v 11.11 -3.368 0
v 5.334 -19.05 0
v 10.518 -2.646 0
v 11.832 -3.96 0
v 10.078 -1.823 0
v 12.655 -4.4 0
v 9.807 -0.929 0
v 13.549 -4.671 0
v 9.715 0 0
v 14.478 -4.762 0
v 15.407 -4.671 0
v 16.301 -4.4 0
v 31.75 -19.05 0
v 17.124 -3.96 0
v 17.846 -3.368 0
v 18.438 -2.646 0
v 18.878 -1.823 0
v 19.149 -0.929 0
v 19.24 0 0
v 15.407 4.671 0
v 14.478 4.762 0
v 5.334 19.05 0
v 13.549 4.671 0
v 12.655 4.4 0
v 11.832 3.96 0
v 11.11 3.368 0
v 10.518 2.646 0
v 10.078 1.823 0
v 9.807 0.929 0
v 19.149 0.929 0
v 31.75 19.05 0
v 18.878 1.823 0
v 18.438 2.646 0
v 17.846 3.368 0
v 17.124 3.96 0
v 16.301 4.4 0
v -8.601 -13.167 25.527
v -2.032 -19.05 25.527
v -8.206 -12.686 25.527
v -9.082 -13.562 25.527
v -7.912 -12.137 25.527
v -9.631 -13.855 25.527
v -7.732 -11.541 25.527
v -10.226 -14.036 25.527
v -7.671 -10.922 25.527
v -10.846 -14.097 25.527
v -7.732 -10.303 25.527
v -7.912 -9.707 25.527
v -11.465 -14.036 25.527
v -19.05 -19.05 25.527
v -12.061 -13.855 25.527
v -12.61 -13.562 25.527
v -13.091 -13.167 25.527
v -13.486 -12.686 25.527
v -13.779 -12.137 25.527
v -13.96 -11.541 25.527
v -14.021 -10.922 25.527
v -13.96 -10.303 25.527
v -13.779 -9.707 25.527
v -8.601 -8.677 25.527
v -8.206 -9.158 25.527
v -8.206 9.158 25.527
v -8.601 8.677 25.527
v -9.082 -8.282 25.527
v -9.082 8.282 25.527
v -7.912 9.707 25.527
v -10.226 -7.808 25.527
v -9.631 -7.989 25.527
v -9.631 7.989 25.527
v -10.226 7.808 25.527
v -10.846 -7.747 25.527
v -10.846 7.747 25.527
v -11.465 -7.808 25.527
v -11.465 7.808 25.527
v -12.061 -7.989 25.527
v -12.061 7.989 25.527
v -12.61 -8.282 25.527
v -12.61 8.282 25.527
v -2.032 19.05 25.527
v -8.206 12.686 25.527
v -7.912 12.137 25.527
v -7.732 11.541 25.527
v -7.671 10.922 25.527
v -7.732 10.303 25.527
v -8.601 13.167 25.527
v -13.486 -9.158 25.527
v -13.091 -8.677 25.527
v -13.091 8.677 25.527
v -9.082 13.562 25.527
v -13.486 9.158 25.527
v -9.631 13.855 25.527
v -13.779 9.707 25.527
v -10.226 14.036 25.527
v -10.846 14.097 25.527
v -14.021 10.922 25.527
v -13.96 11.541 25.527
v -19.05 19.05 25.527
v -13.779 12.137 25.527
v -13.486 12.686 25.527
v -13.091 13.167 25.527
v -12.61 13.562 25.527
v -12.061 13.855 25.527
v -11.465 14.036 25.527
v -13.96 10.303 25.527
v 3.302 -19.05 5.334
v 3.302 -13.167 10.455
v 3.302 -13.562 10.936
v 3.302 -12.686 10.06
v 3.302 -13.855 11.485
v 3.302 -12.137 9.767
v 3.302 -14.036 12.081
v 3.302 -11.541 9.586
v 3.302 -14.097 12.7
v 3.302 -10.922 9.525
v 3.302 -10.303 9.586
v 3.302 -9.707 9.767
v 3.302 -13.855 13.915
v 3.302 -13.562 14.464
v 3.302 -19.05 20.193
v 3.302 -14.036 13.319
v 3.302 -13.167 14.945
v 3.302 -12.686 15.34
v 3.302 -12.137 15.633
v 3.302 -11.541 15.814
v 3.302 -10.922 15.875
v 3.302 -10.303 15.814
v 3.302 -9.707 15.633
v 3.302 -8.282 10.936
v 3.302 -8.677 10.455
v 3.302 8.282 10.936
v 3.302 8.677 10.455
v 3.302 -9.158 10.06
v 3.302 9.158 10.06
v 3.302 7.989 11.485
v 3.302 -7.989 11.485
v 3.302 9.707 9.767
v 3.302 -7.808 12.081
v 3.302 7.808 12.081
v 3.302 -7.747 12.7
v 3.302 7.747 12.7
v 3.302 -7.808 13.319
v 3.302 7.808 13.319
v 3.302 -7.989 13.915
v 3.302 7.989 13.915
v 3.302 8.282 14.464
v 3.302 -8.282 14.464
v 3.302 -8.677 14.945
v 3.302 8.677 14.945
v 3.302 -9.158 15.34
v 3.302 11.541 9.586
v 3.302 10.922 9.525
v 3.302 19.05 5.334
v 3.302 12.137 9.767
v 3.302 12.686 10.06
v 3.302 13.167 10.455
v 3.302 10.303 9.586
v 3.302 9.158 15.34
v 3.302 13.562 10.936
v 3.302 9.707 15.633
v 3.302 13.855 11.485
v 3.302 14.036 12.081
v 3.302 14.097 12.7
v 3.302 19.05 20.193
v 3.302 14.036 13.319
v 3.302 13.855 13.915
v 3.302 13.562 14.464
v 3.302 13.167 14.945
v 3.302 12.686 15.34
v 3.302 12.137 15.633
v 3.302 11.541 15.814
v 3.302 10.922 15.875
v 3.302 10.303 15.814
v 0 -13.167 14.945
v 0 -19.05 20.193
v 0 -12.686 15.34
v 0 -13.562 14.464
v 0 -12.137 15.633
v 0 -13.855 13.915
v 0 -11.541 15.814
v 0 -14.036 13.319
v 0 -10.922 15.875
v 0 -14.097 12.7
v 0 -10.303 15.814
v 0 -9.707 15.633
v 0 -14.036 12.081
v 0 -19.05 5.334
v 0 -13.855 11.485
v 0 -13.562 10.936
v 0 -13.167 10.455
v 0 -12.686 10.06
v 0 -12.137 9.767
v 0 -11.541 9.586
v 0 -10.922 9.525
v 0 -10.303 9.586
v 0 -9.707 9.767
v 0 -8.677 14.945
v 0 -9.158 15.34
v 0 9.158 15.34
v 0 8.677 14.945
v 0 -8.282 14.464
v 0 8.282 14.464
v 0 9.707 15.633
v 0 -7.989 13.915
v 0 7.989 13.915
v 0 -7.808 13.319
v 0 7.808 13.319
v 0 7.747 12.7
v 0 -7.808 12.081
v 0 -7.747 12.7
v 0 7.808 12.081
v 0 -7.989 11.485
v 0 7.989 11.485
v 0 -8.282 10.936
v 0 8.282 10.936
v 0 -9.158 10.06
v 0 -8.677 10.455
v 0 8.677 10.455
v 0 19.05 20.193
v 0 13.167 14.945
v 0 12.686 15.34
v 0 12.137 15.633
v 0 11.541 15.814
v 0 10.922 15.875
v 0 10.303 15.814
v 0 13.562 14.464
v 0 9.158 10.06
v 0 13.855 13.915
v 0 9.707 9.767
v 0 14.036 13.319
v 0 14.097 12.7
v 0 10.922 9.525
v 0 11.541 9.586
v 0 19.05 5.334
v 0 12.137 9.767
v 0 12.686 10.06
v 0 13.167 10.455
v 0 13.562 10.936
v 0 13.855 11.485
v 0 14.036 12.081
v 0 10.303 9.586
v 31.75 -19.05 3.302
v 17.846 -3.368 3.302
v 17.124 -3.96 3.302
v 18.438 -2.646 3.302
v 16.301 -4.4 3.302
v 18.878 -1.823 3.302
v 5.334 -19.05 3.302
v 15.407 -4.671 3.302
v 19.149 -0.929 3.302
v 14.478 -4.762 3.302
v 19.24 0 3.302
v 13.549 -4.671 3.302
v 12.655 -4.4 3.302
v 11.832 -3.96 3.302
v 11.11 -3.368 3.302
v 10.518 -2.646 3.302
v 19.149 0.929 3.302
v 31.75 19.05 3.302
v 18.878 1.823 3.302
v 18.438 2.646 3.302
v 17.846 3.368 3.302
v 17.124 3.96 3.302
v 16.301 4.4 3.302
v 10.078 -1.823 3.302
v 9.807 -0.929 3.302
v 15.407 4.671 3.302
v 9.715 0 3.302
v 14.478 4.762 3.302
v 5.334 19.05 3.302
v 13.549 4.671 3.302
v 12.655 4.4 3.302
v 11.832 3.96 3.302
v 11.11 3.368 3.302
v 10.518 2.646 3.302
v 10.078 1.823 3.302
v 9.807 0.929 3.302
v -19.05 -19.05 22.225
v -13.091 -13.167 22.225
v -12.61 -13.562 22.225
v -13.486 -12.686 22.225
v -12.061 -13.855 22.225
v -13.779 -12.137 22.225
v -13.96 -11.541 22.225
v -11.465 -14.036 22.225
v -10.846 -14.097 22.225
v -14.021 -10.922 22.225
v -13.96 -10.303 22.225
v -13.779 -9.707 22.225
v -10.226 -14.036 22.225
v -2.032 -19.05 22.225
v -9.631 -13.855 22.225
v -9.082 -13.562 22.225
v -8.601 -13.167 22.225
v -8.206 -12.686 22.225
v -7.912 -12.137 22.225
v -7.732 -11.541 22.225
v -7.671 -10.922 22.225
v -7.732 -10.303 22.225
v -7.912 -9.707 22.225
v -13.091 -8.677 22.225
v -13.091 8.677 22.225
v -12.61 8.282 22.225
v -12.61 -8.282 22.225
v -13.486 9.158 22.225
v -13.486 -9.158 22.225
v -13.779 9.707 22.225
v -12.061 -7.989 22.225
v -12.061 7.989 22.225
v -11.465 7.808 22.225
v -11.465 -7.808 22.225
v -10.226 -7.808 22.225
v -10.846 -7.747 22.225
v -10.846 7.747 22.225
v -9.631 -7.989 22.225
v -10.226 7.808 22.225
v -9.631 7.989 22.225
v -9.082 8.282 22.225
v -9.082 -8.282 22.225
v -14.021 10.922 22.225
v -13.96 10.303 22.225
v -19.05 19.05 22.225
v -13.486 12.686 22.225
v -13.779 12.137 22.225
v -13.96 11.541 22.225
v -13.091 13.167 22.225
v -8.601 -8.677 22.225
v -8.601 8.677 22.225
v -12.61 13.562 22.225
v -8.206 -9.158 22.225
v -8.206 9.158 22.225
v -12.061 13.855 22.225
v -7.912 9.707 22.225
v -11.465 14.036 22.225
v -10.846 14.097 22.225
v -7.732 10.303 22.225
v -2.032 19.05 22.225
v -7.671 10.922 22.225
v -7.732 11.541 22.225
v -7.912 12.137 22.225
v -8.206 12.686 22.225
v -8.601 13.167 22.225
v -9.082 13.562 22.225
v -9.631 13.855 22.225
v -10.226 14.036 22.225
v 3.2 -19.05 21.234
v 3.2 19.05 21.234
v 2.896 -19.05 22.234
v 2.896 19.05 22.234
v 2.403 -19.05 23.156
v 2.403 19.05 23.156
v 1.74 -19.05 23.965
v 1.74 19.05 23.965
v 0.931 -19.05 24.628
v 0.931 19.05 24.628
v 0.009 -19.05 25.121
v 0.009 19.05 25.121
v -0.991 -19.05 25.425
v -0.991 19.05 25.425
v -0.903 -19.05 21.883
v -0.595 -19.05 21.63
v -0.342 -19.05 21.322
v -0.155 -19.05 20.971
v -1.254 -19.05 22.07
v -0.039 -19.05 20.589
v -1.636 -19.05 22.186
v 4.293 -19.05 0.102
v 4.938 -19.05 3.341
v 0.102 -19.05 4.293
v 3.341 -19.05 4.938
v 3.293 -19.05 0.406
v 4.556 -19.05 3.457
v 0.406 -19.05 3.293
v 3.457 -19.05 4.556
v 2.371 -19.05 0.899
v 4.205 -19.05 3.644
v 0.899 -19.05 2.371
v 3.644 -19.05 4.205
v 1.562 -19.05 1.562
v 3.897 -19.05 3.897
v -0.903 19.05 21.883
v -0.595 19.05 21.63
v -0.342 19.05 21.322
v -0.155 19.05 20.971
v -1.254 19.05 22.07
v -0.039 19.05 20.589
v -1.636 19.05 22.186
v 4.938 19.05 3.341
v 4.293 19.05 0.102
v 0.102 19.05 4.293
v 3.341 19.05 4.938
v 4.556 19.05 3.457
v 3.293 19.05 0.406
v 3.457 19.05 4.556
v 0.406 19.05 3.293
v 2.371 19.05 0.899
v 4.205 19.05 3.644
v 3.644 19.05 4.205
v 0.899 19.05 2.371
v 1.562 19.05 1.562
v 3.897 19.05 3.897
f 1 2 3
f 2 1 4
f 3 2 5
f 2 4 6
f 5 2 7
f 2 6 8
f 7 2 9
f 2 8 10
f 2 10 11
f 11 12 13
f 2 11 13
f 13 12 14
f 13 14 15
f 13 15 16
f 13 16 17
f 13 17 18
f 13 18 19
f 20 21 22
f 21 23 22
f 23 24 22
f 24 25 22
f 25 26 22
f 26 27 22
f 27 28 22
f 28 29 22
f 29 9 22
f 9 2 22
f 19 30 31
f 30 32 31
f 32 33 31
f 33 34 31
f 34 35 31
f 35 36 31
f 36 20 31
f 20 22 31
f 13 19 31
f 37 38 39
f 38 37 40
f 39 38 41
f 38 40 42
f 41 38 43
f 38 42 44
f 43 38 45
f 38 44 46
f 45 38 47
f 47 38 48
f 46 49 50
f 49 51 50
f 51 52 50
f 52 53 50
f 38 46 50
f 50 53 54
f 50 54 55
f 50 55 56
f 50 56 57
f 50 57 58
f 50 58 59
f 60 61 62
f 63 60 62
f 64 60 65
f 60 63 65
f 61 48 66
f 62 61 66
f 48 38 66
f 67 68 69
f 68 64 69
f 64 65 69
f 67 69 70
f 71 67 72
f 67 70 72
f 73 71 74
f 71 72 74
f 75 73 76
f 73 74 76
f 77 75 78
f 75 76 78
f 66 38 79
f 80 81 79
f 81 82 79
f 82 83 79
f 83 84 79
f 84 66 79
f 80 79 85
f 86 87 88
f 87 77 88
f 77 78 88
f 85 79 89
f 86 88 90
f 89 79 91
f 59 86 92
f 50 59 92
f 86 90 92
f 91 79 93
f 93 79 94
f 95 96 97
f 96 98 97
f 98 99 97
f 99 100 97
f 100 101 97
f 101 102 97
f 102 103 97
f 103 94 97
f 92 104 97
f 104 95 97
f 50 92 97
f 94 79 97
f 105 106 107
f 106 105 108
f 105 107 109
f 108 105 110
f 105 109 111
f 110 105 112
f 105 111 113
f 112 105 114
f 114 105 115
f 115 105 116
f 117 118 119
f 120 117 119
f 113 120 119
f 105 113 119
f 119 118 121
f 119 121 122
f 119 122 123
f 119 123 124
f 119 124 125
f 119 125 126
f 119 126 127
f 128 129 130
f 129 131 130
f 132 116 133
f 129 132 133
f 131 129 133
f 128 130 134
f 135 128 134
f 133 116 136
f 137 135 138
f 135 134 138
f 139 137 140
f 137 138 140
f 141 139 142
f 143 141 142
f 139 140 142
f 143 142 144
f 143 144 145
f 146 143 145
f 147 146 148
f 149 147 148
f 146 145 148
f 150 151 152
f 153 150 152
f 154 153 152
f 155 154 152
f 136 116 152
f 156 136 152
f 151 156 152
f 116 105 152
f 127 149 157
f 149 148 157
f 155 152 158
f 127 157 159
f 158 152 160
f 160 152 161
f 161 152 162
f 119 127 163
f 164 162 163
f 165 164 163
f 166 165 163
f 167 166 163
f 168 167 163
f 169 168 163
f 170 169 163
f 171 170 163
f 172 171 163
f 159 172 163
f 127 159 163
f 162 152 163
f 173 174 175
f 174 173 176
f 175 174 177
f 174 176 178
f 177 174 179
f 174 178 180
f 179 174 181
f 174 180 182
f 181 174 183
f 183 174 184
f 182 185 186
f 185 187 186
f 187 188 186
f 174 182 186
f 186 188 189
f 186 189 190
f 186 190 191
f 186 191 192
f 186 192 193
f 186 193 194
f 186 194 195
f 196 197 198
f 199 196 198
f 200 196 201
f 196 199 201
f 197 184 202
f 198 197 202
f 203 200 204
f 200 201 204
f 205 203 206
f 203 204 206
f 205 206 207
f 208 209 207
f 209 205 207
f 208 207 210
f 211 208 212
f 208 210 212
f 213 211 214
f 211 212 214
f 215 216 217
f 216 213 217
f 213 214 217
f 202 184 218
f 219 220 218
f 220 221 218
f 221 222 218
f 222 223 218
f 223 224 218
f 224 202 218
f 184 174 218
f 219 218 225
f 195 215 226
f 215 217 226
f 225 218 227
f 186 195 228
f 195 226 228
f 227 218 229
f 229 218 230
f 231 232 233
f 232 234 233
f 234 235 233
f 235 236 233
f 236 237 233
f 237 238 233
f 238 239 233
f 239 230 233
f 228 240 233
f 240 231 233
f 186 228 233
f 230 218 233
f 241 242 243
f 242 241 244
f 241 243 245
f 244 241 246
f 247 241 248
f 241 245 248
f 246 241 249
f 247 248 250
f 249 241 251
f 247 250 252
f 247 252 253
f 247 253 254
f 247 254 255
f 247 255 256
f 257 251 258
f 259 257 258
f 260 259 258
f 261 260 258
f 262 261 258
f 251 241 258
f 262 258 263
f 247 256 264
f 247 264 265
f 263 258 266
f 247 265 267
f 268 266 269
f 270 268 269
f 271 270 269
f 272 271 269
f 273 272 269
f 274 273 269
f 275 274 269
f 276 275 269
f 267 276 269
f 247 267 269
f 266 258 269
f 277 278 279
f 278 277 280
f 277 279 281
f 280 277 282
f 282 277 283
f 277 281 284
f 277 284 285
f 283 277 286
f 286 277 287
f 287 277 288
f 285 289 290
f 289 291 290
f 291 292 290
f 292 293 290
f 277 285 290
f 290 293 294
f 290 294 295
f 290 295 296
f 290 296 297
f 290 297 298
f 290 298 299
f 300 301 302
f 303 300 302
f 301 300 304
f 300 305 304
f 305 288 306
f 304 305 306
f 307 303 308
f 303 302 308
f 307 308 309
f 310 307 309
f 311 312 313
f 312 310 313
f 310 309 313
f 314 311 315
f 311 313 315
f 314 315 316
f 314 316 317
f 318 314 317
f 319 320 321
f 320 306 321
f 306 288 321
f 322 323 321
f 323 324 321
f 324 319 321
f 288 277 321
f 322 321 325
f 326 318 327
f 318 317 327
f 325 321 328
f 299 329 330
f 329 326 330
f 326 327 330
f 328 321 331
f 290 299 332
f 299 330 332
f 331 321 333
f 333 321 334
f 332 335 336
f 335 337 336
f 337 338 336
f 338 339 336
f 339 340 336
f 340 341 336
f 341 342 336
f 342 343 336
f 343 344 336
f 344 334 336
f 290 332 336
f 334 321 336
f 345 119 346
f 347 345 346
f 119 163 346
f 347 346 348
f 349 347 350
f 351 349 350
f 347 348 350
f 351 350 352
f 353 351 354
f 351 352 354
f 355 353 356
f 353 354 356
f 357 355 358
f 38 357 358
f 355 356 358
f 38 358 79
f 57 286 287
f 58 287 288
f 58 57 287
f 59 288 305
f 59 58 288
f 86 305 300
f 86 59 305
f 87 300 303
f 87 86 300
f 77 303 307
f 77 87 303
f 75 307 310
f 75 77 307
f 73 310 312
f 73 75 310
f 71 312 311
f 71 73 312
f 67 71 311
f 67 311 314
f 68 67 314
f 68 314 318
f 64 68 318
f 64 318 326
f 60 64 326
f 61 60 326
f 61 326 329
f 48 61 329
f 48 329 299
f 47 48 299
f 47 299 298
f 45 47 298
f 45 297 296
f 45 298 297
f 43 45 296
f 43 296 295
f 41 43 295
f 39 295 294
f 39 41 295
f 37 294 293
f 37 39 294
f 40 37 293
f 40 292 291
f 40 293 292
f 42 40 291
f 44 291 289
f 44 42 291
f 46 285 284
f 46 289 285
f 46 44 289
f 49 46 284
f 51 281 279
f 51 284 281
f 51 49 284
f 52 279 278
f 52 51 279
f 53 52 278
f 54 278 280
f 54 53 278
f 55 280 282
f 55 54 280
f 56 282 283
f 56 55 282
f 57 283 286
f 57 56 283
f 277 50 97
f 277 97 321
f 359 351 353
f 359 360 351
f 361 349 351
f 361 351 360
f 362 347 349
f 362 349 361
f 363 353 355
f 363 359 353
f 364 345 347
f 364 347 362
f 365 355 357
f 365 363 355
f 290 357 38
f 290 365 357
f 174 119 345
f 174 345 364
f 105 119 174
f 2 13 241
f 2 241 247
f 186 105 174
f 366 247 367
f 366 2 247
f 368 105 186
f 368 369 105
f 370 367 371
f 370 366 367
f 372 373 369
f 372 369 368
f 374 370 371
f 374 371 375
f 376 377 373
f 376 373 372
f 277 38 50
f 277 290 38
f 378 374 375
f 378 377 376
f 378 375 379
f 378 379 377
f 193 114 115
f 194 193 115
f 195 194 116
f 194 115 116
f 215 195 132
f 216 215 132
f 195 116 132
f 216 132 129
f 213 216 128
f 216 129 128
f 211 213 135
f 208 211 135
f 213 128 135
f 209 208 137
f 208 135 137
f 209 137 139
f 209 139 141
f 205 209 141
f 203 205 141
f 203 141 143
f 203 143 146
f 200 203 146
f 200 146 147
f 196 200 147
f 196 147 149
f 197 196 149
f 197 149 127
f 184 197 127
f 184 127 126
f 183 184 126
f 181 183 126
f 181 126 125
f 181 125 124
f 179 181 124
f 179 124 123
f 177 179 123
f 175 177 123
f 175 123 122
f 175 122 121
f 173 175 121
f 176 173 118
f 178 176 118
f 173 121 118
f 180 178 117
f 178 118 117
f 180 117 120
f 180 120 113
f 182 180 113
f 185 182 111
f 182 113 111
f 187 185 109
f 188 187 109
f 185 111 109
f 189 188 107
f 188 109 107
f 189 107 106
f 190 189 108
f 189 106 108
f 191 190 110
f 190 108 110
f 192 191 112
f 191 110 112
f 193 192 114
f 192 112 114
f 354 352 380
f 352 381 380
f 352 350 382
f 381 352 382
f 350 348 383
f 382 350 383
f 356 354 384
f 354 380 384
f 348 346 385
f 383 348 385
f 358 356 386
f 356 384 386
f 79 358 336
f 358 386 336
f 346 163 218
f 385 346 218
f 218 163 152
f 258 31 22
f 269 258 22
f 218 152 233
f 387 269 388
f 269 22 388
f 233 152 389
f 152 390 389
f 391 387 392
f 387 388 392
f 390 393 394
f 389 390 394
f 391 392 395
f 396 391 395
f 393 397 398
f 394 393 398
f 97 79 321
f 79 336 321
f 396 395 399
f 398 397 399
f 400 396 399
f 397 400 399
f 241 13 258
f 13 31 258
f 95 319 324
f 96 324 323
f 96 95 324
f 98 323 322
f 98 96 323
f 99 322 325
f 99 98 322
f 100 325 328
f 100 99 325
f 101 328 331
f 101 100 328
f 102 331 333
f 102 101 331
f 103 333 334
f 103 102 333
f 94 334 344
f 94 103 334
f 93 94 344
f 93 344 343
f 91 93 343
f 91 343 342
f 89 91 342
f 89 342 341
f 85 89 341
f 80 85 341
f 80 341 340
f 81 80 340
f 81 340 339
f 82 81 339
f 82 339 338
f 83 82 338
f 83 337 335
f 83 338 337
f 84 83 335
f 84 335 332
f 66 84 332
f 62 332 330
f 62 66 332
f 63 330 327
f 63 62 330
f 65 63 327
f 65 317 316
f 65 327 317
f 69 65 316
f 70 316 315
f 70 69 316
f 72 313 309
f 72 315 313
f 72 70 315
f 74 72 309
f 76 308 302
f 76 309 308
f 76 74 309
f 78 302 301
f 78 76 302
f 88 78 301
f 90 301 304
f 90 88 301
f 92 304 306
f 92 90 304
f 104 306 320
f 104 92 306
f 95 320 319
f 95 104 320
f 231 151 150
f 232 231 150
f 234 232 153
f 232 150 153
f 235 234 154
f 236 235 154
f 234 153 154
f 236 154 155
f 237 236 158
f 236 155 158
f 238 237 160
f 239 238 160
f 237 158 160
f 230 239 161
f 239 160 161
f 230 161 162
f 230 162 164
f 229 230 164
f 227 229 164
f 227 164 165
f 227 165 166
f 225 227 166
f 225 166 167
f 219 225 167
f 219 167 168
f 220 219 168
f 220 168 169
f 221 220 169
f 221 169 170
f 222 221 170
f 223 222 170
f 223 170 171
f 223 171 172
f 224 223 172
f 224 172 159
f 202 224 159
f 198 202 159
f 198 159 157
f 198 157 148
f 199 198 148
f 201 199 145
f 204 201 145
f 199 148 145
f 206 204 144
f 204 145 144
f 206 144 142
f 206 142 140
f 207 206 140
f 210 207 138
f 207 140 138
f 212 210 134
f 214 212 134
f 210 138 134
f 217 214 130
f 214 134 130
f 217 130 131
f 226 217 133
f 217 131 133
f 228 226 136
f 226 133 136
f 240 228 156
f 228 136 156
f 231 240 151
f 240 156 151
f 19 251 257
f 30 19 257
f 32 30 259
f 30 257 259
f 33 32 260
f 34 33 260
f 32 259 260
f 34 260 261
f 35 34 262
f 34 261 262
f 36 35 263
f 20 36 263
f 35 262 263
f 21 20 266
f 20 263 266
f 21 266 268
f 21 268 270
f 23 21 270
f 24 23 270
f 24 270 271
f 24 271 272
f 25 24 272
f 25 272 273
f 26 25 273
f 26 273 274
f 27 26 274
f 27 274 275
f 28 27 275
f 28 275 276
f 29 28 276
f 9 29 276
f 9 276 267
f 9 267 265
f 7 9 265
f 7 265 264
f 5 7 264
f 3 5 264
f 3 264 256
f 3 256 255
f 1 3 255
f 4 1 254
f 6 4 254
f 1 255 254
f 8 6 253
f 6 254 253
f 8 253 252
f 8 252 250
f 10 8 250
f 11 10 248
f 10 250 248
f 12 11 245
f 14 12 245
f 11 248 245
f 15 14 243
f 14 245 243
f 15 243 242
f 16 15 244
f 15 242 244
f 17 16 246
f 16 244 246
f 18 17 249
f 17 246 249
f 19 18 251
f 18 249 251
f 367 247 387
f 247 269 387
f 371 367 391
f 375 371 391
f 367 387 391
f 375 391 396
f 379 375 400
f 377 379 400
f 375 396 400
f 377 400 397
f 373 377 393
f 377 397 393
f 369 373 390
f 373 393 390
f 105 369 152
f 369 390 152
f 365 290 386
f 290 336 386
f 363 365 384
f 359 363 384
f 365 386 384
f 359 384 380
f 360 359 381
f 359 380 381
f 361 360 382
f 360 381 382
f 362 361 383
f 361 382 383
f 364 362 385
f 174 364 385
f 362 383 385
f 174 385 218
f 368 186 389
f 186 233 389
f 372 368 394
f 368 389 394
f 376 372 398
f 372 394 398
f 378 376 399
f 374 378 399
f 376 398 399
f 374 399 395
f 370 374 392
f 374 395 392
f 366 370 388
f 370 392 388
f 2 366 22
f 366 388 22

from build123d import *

# Parameters (mm, degrees)
EXTRUDE_THIN1_DEPTH = 19.05
SKETCH4_R           = 3.175
EXTRUDE3_DEPTH      = 26.527
SKETCH9_R           = 3.175
CUT_EXTRUDE3_DEPTH  = 23.352
SKETCH8_R           = 4.7625
CUT_EXTRUDE2_DEPTH  = 4.302


with BuildPart() as part:
    # Sketch1 → Extrude-Thin1 (new body, symmetric)
    with BuildSketch(Plane(origin=(0, 0, 0), x_dir=(1, 0, 0), z_dir=(0, 1, 0))):
        with BuildLine():
            Line((-19.05, -22.225), (-2.032, -22.225))
            ThreePointArc((-2.032, -22.225), (-0.595159021, -21.629840979), (0, -20.193))
            Line((0, -20.193), (0, -5.334))
            ThreePointArc((0, -5.334), (1.562292429, -1.562292429), (5.334, 0))
            Line((5.334, 0), (31.75, 0))
            Line((31.75, 0), (31.75, -3.302))
            Line((31.75, -3.302), (5.334, -3.302))
            ThreePointArc((5.334, -3.302), (3.897159021, -3.897159021), (3.302, -5.334))
            Line((3.302, -5.334), (3.302, -20.193))
            ThreePointArc((3.302, -20.193), (1.739707571, -23.964707571), (-2.032, -25.527))
            Line((-2.032, -25.527), (-19.05, -25.527))
            Line((-19.05, -25.527), (-19.05, -22.225))
        make_face()
    extrude(amount=EXTRUDE_THIN1_DEPTH, both=True)

    # Sketch4 → Extrude3 (cut, through all)
    with BuildSketch(Plane(origin=(-22.225, 0, 25.527), x_dir=(-1, 0, 0), z_dir=(0, 0, -1))):
        with Locations((-11.3792, 10.922)):
            Circle(SKETCH4_R)
        with Locations((-11.3792, -10.922)):
            Circle(SKETCH4_R)
    extrude(amount=EXTRUDE3_DEPTH, mode=Mode.SUBTRACT)

    # Sketch9 → Cut-Extrude3 (cut, through all)
    with BuildSketch(Plane(origin=(3.302, 0, 0), x_dir=(0, 0, -1), z_dir=(1, 0, 0))):
        with Locations((-12.7, 10.922)):
            Circle(SKETCH9_R)
        with Locations((-12.7, -10.922)):
            Circle(SKETCH9_R)
    extrude(amount=-CUT_EXTRUDE3_DEPTH, mode=Mode.SUBTRACT)

    # Sketch8 → Cut-Extrude2 (cut, through all)
    with BuildSketch(Plane.XY.offset(3.302)):
        with Locations((14.478, 0)):
            Circle(SKETCH8_R)
        with Locations((-55.372, 0)):
            Circle(SKETCH8_R)
    extrude(amount=-CUT_EXTRUDE2_DEPTH, mode=Mode.SUBTRACT)


solid = part.part
